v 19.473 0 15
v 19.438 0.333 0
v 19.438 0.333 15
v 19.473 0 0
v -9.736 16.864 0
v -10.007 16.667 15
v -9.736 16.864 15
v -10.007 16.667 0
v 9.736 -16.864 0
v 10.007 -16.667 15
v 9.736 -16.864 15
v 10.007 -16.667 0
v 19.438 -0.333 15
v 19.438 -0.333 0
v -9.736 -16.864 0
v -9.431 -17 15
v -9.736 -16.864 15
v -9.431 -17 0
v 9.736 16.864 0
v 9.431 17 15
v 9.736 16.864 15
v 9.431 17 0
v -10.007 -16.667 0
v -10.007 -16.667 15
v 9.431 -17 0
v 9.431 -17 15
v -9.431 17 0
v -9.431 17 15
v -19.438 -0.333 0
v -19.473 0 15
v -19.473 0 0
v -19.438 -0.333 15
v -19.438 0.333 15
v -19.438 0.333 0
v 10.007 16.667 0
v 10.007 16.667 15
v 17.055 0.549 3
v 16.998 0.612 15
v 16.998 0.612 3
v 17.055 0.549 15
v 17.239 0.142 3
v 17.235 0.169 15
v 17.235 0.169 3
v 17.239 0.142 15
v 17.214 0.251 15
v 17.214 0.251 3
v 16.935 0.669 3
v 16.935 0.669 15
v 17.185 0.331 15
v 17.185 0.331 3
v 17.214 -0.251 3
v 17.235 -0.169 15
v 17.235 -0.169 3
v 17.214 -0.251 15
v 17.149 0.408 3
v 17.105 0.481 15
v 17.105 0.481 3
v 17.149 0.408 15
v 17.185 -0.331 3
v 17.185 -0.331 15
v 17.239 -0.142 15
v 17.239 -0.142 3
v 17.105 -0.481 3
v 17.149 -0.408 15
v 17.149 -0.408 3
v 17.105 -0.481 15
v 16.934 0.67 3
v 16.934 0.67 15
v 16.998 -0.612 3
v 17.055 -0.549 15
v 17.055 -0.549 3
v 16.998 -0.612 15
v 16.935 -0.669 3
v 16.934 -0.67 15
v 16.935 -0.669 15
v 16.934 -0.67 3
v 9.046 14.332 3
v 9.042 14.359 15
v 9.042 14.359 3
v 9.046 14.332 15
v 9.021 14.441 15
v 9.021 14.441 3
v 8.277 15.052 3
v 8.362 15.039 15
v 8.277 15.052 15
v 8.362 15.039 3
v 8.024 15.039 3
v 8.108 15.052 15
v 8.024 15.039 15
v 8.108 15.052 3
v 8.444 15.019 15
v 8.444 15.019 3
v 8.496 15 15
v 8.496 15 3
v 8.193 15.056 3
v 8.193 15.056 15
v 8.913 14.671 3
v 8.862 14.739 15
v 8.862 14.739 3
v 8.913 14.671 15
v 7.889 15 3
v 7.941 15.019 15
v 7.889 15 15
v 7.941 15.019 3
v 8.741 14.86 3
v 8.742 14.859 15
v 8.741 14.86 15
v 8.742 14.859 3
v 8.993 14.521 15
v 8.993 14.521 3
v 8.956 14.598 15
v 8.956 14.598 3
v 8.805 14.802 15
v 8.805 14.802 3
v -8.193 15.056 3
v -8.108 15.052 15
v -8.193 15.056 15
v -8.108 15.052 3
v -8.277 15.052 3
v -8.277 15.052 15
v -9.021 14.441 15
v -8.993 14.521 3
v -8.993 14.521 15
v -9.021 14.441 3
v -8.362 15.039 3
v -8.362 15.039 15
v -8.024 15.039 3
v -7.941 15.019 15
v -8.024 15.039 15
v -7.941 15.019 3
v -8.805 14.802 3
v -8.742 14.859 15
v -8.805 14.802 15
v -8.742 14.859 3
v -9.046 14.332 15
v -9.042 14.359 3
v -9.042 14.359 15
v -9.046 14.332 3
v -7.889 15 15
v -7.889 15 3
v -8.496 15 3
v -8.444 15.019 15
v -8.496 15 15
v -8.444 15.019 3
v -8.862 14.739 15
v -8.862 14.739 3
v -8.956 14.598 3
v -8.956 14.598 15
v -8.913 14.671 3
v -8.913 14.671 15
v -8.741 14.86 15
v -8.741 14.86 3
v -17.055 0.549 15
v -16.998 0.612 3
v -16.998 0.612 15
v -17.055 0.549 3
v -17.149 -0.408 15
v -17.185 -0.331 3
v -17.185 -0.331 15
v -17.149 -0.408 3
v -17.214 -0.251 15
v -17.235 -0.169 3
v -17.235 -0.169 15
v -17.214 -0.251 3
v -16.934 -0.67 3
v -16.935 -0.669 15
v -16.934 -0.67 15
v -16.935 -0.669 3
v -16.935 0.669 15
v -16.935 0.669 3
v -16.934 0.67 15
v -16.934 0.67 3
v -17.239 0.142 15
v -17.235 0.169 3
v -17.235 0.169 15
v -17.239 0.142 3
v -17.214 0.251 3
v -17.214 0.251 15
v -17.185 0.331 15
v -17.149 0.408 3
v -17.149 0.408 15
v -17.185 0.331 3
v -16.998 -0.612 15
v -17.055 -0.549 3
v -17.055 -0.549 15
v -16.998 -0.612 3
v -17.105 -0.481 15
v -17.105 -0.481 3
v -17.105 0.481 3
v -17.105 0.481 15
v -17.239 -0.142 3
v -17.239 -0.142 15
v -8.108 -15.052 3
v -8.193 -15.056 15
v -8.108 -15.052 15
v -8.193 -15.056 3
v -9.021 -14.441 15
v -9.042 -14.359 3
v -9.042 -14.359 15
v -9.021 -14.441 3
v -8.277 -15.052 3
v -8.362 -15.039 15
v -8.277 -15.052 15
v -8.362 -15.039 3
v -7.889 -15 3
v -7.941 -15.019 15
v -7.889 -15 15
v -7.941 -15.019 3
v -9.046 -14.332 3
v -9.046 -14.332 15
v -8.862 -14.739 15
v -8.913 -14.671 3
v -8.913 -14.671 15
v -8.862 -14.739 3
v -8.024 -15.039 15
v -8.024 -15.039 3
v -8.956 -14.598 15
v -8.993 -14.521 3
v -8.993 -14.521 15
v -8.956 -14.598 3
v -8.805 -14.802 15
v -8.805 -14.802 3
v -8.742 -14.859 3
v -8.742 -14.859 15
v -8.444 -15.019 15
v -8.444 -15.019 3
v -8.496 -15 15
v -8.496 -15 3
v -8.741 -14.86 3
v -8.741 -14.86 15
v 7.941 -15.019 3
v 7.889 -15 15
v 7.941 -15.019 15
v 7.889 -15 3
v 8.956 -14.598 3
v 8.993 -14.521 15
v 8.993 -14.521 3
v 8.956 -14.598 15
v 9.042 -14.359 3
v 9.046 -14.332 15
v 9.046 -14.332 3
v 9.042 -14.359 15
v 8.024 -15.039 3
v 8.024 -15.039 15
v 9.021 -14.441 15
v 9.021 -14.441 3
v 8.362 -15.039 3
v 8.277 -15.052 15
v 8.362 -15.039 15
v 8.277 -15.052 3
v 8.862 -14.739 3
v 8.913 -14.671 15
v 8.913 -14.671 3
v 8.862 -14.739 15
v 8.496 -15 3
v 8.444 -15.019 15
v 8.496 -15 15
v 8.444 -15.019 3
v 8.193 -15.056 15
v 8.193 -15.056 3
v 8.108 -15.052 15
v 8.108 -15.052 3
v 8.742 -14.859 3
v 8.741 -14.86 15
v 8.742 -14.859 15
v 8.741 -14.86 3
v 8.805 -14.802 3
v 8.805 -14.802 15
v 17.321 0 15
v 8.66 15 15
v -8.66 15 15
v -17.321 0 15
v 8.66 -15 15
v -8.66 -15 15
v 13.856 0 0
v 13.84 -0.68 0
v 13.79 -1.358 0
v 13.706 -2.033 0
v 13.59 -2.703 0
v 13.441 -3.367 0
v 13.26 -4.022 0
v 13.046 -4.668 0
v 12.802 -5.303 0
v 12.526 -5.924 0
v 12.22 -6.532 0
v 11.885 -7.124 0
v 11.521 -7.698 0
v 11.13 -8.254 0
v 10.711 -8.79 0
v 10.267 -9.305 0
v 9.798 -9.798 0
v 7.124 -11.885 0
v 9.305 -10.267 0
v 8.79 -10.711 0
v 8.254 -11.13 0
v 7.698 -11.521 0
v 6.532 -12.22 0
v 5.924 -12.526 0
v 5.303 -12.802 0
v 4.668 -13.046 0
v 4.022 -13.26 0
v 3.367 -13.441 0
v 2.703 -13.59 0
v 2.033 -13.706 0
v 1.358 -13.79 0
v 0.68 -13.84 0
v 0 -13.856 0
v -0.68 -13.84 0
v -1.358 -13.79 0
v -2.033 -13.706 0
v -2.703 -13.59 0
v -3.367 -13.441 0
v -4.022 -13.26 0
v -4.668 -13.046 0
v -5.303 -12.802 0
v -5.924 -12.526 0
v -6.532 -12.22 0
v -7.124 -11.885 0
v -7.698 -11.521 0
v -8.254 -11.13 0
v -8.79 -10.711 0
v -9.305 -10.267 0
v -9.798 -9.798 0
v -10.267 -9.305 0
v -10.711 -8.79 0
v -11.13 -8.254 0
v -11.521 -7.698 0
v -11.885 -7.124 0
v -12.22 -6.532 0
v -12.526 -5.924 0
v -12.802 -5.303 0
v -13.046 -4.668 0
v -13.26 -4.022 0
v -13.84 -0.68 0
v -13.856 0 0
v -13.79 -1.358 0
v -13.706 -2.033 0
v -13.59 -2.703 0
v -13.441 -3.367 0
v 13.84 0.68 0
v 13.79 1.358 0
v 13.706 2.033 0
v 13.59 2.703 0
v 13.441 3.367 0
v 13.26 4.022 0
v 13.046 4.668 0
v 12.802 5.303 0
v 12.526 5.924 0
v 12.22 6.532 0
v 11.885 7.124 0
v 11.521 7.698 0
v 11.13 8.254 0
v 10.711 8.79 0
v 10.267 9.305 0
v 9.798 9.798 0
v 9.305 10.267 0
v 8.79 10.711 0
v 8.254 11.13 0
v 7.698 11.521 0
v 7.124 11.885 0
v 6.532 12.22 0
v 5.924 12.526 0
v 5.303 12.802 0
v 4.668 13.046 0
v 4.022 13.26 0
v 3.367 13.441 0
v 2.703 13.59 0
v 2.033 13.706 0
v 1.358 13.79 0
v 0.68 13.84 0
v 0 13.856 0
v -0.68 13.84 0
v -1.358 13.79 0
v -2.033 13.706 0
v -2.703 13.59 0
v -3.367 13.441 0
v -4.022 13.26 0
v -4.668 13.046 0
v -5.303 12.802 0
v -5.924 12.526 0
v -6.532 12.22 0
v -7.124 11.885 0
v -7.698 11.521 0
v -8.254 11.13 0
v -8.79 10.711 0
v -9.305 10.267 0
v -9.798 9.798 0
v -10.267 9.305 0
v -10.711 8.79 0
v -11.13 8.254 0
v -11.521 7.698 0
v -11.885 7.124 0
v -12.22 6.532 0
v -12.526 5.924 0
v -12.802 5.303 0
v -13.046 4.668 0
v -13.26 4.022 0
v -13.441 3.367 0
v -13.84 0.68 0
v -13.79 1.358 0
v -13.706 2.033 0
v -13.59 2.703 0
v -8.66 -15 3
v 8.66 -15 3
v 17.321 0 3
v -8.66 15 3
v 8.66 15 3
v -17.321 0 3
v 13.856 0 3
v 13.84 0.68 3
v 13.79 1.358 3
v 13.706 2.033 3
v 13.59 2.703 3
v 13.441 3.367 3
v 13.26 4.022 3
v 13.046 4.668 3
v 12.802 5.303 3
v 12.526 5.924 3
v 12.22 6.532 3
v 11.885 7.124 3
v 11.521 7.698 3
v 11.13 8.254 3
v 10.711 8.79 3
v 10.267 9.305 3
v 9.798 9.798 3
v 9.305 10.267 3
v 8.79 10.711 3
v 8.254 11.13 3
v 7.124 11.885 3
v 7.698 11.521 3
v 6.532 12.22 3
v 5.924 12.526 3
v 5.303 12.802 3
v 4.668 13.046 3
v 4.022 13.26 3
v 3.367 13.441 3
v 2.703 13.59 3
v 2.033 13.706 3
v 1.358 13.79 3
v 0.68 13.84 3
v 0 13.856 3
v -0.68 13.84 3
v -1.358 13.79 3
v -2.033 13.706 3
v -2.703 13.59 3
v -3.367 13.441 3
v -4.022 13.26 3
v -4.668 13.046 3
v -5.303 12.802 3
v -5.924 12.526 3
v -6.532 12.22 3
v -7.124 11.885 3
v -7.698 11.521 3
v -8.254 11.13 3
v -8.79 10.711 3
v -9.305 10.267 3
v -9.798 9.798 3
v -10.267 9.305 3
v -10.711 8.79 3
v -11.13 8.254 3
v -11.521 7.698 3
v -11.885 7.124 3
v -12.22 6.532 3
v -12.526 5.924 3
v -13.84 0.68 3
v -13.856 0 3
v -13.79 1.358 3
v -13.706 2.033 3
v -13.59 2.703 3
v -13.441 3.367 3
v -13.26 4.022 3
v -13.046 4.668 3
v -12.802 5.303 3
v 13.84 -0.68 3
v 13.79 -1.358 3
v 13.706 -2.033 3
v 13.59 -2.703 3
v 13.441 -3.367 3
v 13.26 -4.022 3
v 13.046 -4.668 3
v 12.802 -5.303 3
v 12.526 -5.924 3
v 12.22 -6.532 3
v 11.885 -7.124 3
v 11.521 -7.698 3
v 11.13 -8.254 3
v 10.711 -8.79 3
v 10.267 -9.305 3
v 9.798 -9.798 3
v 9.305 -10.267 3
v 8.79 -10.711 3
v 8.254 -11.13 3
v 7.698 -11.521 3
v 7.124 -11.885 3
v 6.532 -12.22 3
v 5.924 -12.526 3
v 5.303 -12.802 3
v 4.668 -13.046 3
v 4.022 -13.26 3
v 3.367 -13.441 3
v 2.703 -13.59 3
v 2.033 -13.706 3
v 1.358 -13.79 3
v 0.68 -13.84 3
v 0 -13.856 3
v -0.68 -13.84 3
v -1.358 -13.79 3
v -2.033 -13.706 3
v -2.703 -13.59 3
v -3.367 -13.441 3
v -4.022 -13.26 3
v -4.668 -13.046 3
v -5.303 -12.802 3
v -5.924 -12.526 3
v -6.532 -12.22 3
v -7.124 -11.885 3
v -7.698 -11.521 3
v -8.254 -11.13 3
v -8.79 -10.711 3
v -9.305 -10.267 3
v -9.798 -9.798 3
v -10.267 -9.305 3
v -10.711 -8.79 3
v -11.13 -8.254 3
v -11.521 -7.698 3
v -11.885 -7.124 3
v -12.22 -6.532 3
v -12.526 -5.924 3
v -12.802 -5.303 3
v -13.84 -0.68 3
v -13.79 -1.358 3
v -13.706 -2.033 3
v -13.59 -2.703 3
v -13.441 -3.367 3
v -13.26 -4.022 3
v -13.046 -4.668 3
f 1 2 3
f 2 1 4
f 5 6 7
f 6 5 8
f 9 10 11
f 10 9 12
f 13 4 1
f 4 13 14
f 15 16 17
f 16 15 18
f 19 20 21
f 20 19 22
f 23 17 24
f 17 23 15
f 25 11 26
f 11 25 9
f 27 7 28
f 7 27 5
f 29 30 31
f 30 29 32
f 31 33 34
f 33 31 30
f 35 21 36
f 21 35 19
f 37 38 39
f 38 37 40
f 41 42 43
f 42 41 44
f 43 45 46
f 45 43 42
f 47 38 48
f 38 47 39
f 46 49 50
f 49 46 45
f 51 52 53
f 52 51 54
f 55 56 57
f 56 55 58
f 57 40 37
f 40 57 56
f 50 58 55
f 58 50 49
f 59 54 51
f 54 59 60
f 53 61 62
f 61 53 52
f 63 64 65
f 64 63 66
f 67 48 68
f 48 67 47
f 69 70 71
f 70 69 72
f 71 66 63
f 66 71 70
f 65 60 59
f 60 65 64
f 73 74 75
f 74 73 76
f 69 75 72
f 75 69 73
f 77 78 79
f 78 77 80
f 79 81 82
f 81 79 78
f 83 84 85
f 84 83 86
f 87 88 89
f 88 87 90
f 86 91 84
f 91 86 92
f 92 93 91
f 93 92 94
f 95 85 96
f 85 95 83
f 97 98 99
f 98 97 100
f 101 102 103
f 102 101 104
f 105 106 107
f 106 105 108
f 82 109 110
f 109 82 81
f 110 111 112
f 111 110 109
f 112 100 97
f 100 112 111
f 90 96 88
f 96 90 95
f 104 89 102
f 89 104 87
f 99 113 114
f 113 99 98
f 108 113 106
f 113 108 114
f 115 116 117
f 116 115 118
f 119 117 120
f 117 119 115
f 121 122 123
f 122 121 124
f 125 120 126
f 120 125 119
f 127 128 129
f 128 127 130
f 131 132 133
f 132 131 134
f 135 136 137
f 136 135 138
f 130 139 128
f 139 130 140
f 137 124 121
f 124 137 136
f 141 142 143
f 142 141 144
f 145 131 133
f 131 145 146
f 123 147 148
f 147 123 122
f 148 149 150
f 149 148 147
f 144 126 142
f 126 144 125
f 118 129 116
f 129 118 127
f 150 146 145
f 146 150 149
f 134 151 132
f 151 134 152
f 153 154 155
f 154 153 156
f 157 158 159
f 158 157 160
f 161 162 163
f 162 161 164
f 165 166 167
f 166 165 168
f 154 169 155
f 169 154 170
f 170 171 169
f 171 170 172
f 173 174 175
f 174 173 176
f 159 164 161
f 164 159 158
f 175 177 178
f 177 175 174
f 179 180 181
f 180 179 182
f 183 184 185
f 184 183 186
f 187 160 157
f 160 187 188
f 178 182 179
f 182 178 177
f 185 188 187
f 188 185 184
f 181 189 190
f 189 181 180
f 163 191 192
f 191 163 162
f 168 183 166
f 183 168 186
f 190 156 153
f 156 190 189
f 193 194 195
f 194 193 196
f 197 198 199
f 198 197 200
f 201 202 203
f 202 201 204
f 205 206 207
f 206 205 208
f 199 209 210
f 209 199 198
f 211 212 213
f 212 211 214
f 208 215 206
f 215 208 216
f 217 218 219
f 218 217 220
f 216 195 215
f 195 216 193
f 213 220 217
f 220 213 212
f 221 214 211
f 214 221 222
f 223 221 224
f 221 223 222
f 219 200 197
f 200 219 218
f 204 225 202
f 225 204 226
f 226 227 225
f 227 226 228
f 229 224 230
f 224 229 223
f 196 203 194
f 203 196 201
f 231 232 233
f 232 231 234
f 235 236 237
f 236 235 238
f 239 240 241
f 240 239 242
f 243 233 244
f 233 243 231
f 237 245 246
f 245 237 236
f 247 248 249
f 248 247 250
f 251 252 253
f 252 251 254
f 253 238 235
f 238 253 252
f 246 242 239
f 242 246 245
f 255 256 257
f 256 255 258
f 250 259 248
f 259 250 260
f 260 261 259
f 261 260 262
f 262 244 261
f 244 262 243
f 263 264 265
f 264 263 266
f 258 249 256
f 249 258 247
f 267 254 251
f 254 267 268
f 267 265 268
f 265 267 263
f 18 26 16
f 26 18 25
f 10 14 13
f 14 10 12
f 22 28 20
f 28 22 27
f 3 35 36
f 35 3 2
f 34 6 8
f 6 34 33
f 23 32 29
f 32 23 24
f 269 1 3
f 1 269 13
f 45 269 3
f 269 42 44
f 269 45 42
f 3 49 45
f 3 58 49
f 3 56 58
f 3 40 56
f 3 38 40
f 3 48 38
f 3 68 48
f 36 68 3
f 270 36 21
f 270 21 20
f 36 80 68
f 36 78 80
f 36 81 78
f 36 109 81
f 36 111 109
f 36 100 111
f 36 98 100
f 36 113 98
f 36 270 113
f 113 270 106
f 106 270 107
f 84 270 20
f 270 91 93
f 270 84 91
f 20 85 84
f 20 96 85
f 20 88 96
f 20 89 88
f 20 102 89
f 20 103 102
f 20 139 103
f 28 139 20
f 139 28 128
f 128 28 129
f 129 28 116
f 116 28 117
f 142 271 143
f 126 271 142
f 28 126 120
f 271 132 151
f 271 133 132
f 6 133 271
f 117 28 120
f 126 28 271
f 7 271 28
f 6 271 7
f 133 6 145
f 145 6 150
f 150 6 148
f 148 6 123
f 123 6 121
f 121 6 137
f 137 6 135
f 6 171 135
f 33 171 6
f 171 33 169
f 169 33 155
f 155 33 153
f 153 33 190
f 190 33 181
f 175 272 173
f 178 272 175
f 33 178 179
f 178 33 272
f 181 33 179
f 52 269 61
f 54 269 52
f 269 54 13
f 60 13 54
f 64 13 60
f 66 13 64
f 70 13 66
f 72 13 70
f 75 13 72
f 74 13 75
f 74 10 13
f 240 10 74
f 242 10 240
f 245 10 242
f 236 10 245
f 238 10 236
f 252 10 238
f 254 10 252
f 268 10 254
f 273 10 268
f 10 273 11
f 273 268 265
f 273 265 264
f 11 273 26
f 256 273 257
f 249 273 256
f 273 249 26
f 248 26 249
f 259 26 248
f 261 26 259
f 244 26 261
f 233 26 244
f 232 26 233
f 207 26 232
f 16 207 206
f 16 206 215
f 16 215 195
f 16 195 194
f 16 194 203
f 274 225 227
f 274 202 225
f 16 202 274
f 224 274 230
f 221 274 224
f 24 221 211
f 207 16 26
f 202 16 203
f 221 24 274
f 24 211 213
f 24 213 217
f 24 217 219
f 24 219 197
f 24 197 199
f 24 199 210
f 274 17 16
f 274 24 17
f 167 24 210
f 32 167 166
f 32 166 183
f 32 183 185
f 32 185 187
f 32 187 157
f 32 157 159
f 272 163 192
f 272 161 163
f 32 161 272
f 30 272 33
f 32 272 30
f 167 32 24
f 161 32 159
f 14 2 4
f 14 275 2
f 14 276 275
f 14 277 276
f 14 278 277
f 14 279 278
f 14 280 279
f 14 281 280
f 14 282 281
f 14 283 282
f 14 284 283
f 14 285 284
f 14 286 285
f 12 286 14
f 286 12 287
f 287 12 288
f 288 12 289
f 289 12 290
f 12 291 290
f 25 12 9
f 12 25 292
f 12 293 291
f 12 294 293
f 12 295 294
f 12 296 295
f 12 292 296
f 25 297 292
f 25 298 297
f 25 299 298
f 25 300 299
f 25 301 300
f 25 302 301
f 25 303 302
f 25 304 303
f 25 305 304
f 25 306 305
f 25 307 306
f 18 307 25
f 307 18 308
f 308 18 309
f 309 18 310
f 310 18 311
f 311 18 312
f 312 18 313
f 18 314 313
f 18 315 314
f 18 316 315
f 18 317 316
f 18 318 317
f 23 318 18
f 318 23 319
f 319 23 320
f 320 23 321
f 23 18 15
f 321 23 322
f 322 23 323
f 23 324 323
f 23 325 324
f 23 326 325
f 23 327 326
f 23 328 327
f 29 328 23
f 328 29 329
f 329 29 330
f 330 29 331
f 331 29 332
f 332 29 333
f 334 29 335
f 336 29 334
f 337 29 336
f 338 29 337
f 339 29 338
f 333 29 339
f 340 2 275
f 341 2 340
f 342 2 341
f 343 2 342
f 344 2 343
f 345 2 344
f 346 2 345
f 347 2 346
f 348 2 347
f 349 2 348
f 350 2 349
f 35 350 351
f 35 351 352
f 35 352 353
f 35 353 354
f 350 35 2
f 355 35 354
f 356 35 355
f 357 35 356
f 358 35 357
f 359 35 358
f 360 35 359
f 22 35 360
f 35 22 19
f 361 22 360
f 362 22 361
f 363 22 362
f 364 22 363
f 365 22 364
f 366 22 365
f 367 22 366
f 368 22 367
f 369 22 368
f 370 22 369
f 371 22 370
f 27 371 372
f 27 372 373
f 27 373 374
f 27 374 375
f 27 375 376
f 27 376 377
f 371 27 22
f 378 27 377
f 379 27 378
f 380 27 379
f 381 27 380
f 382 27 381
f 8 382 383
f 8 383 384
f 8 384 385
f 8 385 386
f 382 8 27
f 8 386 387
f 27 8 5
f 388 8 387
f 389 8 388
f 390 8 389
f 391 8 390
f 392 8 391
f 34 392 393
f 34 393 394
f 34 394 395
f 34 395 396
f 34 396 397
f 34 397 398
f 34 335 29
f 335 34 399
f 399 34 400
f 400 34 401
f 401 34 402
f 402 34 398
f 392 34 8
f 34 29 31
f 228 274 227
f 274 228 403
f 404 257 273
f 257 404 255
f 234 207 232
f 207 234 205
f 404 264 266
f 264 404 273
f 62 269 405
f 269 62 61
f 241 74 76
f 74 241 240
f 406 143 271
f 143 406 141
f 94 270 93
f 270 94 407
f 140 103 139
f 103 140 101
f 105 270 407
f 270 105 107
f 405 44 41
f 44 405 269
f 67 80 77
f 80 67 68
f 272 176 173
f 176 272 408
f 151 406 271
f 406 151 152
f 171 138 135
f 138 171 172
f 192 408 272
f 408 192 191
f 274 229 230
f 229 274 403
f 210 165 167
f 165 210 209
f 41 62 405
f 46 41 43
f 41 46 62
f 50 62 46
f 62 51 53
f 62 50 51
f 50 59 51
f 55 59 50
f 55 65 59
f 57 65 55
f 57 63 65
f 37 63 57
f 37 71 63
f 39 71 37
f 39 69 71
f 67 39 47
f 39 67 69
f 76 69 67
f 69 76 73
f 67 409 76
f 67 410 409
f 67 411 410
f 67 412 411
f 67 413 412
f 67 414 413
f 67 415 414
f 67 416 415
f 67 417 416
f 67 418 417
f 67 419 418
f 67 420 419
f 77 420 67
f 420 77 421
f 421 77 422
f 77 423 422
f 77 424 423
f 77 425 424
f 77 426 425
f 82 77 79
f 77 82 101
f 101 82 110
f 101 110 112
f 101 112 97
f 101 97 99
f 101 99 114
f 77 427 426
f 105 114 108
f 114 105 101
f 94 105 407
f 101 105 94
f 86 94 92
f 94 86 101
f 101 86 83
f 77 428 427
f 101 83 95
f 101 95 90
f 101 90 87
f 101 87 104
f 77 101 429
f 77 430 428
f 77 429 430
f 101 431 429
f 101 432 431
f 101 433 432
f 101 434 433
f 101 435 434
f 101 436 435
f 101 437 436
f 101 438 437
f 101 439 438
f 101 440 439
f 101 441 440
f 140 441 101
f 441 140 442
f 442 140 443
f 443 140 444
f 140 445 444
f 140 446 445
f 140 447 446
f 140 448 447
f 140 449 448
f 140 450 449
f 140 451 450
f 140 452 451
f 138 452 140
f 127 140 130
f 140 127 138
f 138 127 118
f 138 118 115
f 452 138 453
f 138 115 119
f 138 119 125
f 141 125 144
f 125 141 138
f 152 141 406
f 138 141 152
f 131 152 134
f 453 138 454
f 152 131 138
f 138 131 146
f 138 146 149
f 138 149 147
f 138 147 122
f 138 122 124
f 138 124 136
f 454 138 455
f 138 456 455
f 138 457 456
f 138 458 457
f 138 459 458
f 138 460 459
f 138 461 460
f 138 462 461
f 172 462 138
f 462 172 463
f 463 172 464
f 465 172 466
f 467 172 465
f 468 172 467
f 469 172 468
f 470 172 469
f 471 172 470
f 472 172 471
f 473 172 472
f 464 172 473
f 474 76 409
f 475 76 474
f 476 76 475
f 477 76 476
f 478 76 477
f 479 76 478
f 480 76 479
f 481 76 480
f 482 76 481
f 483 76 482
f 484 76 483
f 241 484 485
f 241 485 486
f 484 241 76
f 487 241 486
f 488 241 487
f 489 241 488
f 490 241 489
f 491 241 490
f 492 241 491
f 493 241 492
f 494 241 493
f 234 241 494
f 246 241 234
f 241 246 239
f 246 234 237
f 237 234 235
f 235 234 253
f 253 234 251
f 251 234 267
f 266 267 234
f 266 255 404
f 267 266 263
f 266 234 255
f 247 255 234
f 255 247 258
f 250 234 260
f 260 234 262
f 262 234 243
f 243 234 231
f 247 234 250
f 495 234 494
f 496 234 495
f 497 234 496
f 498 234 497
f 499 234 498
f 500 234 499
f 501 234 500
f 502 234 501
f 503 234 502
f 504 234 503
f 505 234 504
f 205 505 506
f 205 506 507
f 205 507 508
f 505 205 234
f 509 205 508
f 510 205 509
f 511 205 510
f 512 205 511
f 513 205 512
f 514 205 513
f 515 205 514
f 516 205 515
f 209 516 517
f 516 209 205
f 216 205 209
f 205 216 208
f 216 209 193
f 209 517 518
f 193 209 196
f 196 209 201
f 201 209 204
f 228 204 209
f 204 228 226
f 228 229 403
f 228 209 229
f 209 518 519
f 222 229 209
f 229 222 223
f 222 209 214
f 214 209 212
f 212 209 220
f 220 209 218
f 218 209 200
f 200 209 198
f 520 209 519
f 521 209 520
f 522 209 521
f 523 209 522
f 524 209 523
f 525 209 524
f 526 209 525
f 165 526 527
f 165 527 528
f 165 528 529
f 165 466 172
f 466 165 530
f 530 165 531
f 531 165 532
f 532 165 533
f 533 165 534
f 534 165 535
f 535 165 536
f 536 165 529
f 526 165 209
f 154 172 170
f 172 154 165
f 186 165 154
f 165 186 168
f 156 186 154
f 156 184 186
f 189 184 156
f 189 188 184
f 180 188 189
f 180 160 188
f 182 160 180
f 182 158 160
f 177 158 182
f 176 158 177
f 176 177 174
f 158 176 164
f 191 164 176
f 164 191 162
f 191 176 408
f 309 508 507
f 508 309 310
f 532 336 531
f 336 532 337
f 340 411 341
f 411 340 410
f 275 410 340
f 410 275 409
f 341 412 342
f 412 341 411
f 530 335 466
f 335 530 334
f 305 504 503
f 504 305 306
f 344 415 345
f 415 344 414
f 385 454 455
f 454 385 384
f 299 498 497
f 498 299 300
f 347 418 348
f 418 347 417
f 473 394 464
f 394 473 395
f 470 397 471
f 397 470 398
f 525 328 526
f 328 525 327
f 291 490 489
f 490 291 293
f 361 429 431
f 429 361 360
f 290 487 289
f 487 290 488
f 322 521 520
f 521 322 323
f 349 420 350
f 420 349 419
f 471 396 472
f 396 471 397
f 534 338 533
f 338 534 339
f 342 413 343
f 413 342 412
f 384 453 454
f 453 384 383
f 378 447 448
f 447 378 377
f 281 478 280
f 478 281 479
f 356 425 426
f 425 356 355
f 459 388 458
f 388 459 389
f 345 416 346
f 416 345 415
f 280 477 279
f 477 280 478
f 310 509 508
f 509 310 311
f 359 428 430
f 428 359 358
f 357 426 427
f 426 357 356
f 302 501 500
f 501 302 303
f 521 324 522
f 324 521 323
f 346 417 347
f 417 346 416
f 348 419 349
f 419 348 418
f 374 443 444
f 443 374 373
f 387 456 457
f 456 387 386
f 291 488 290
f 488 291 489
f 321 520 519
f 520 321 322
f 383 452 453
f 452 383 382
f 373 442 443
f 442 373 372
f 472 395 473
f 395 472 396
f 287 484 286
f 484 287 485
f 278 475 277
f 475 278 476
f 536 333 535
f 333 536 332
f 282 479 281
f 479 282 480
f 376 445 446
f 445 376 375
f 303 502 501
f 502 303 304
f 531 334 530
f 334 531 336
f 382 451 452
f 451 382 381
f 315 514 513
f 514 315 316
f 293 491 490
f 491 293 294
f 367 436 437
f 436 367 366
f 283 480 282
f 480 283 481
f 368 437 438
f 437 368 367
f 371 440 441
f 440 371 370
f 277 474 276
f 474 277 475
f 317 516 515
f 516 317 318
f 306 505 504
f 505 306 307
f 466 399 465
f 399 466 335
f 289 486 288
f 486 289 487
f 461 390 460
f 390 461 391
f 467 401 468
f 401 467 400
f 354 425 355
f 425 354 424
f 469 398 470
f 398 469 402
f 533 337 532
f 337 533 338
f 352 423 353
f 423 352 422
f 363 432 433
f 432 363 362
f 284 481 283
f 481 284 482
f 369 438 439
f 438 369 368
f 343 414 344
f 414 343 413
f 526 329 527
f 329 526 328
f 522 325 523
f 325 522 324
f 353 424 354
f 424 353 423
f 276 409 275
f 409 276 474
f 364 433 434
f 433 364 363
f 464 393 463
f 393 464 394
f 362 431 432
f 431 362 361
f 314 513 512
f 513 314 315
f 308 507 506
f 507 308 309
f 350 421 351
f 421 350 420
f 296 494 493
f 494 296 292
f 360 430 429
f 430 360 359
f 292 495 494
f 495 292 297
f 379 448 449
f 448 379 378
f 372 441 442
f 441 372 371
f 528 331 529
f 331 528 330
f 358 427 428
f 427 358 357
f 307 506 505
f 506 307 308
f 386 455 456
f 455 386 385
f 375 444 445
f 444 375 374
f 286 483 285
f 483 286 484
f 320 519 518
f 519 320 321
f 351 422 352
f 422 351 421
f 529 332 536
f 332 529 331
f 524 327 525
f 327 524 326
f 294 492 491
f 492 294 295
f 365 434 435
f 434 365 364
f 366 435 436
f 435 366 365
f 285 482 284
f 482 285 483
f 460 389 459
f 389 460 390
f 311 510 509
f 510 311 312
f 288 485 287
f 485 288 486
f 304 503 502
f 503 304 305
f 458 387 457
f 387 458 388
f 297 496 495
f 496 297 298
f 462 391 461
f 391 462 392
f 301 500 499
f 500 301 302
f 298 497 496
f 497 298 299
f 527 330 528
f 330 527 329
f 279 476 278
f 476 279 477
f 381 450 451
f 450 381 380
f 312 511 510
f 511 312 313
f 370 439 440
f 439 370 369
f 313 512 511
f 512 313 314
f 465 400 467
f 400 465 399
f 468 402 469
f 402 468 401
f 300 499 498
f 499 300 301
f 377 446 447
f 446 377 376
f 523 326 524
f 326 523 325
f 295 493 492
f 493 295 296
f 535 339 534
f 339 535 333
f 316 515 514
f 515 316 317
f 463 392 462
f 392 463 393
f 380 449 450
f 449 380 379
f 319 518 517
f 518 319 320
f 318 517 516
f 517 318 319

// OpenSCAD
height = 15;
dOut = 34*2/sqrt(3);
dIn = 30*2/sqrt(3);
doCenter = false;

module outerHex(height)
{
    cylinder(d=dOut, h=height, center = doCenter, $fn=6);
}
module innerHex()
{
    cylinder(d=dIn, h=2*height+1, center = true, $fn=6);
}
module outerRounding()
{
	difference()
	{
	    cylinder(d=dOut* 1.01,h=2*height+1, center = true);
	    cylinder(d=dOut * 0.992,h=2*height+2, center = true);
	}
}

module innerRounding()
{
    for (i = [0 : 1 : 5]) 
    {
        size = .02 * dIn;
        translate((dIn - 2.7*size)/2*[cos(i*60),sin(i*60)])
       {
           cylinder(d=dIn* 0.05,h=2*height+2, center = true, $fn=64);
       }
    }
}
module bottomSupport()
{
    difference()
    {
        outerHex(3);
        cylinder(d=dIn * 0.8,h=2*height+2, center = true, $fn=128);
    }
}


module Adaptor()
{
union()
{
    difference()
    {
        outerHex(height);
        innerHex();
        outerRounding();    
        innerRounding();
    }
    difference()
    {
        bottomSupport();
        outerRounding();    
    }
}
}

module extraPart()
{
    cylinder(d=2, h = height+2, center = true, $fn=128);
}

// render
Adaptor();
//extraPart();
